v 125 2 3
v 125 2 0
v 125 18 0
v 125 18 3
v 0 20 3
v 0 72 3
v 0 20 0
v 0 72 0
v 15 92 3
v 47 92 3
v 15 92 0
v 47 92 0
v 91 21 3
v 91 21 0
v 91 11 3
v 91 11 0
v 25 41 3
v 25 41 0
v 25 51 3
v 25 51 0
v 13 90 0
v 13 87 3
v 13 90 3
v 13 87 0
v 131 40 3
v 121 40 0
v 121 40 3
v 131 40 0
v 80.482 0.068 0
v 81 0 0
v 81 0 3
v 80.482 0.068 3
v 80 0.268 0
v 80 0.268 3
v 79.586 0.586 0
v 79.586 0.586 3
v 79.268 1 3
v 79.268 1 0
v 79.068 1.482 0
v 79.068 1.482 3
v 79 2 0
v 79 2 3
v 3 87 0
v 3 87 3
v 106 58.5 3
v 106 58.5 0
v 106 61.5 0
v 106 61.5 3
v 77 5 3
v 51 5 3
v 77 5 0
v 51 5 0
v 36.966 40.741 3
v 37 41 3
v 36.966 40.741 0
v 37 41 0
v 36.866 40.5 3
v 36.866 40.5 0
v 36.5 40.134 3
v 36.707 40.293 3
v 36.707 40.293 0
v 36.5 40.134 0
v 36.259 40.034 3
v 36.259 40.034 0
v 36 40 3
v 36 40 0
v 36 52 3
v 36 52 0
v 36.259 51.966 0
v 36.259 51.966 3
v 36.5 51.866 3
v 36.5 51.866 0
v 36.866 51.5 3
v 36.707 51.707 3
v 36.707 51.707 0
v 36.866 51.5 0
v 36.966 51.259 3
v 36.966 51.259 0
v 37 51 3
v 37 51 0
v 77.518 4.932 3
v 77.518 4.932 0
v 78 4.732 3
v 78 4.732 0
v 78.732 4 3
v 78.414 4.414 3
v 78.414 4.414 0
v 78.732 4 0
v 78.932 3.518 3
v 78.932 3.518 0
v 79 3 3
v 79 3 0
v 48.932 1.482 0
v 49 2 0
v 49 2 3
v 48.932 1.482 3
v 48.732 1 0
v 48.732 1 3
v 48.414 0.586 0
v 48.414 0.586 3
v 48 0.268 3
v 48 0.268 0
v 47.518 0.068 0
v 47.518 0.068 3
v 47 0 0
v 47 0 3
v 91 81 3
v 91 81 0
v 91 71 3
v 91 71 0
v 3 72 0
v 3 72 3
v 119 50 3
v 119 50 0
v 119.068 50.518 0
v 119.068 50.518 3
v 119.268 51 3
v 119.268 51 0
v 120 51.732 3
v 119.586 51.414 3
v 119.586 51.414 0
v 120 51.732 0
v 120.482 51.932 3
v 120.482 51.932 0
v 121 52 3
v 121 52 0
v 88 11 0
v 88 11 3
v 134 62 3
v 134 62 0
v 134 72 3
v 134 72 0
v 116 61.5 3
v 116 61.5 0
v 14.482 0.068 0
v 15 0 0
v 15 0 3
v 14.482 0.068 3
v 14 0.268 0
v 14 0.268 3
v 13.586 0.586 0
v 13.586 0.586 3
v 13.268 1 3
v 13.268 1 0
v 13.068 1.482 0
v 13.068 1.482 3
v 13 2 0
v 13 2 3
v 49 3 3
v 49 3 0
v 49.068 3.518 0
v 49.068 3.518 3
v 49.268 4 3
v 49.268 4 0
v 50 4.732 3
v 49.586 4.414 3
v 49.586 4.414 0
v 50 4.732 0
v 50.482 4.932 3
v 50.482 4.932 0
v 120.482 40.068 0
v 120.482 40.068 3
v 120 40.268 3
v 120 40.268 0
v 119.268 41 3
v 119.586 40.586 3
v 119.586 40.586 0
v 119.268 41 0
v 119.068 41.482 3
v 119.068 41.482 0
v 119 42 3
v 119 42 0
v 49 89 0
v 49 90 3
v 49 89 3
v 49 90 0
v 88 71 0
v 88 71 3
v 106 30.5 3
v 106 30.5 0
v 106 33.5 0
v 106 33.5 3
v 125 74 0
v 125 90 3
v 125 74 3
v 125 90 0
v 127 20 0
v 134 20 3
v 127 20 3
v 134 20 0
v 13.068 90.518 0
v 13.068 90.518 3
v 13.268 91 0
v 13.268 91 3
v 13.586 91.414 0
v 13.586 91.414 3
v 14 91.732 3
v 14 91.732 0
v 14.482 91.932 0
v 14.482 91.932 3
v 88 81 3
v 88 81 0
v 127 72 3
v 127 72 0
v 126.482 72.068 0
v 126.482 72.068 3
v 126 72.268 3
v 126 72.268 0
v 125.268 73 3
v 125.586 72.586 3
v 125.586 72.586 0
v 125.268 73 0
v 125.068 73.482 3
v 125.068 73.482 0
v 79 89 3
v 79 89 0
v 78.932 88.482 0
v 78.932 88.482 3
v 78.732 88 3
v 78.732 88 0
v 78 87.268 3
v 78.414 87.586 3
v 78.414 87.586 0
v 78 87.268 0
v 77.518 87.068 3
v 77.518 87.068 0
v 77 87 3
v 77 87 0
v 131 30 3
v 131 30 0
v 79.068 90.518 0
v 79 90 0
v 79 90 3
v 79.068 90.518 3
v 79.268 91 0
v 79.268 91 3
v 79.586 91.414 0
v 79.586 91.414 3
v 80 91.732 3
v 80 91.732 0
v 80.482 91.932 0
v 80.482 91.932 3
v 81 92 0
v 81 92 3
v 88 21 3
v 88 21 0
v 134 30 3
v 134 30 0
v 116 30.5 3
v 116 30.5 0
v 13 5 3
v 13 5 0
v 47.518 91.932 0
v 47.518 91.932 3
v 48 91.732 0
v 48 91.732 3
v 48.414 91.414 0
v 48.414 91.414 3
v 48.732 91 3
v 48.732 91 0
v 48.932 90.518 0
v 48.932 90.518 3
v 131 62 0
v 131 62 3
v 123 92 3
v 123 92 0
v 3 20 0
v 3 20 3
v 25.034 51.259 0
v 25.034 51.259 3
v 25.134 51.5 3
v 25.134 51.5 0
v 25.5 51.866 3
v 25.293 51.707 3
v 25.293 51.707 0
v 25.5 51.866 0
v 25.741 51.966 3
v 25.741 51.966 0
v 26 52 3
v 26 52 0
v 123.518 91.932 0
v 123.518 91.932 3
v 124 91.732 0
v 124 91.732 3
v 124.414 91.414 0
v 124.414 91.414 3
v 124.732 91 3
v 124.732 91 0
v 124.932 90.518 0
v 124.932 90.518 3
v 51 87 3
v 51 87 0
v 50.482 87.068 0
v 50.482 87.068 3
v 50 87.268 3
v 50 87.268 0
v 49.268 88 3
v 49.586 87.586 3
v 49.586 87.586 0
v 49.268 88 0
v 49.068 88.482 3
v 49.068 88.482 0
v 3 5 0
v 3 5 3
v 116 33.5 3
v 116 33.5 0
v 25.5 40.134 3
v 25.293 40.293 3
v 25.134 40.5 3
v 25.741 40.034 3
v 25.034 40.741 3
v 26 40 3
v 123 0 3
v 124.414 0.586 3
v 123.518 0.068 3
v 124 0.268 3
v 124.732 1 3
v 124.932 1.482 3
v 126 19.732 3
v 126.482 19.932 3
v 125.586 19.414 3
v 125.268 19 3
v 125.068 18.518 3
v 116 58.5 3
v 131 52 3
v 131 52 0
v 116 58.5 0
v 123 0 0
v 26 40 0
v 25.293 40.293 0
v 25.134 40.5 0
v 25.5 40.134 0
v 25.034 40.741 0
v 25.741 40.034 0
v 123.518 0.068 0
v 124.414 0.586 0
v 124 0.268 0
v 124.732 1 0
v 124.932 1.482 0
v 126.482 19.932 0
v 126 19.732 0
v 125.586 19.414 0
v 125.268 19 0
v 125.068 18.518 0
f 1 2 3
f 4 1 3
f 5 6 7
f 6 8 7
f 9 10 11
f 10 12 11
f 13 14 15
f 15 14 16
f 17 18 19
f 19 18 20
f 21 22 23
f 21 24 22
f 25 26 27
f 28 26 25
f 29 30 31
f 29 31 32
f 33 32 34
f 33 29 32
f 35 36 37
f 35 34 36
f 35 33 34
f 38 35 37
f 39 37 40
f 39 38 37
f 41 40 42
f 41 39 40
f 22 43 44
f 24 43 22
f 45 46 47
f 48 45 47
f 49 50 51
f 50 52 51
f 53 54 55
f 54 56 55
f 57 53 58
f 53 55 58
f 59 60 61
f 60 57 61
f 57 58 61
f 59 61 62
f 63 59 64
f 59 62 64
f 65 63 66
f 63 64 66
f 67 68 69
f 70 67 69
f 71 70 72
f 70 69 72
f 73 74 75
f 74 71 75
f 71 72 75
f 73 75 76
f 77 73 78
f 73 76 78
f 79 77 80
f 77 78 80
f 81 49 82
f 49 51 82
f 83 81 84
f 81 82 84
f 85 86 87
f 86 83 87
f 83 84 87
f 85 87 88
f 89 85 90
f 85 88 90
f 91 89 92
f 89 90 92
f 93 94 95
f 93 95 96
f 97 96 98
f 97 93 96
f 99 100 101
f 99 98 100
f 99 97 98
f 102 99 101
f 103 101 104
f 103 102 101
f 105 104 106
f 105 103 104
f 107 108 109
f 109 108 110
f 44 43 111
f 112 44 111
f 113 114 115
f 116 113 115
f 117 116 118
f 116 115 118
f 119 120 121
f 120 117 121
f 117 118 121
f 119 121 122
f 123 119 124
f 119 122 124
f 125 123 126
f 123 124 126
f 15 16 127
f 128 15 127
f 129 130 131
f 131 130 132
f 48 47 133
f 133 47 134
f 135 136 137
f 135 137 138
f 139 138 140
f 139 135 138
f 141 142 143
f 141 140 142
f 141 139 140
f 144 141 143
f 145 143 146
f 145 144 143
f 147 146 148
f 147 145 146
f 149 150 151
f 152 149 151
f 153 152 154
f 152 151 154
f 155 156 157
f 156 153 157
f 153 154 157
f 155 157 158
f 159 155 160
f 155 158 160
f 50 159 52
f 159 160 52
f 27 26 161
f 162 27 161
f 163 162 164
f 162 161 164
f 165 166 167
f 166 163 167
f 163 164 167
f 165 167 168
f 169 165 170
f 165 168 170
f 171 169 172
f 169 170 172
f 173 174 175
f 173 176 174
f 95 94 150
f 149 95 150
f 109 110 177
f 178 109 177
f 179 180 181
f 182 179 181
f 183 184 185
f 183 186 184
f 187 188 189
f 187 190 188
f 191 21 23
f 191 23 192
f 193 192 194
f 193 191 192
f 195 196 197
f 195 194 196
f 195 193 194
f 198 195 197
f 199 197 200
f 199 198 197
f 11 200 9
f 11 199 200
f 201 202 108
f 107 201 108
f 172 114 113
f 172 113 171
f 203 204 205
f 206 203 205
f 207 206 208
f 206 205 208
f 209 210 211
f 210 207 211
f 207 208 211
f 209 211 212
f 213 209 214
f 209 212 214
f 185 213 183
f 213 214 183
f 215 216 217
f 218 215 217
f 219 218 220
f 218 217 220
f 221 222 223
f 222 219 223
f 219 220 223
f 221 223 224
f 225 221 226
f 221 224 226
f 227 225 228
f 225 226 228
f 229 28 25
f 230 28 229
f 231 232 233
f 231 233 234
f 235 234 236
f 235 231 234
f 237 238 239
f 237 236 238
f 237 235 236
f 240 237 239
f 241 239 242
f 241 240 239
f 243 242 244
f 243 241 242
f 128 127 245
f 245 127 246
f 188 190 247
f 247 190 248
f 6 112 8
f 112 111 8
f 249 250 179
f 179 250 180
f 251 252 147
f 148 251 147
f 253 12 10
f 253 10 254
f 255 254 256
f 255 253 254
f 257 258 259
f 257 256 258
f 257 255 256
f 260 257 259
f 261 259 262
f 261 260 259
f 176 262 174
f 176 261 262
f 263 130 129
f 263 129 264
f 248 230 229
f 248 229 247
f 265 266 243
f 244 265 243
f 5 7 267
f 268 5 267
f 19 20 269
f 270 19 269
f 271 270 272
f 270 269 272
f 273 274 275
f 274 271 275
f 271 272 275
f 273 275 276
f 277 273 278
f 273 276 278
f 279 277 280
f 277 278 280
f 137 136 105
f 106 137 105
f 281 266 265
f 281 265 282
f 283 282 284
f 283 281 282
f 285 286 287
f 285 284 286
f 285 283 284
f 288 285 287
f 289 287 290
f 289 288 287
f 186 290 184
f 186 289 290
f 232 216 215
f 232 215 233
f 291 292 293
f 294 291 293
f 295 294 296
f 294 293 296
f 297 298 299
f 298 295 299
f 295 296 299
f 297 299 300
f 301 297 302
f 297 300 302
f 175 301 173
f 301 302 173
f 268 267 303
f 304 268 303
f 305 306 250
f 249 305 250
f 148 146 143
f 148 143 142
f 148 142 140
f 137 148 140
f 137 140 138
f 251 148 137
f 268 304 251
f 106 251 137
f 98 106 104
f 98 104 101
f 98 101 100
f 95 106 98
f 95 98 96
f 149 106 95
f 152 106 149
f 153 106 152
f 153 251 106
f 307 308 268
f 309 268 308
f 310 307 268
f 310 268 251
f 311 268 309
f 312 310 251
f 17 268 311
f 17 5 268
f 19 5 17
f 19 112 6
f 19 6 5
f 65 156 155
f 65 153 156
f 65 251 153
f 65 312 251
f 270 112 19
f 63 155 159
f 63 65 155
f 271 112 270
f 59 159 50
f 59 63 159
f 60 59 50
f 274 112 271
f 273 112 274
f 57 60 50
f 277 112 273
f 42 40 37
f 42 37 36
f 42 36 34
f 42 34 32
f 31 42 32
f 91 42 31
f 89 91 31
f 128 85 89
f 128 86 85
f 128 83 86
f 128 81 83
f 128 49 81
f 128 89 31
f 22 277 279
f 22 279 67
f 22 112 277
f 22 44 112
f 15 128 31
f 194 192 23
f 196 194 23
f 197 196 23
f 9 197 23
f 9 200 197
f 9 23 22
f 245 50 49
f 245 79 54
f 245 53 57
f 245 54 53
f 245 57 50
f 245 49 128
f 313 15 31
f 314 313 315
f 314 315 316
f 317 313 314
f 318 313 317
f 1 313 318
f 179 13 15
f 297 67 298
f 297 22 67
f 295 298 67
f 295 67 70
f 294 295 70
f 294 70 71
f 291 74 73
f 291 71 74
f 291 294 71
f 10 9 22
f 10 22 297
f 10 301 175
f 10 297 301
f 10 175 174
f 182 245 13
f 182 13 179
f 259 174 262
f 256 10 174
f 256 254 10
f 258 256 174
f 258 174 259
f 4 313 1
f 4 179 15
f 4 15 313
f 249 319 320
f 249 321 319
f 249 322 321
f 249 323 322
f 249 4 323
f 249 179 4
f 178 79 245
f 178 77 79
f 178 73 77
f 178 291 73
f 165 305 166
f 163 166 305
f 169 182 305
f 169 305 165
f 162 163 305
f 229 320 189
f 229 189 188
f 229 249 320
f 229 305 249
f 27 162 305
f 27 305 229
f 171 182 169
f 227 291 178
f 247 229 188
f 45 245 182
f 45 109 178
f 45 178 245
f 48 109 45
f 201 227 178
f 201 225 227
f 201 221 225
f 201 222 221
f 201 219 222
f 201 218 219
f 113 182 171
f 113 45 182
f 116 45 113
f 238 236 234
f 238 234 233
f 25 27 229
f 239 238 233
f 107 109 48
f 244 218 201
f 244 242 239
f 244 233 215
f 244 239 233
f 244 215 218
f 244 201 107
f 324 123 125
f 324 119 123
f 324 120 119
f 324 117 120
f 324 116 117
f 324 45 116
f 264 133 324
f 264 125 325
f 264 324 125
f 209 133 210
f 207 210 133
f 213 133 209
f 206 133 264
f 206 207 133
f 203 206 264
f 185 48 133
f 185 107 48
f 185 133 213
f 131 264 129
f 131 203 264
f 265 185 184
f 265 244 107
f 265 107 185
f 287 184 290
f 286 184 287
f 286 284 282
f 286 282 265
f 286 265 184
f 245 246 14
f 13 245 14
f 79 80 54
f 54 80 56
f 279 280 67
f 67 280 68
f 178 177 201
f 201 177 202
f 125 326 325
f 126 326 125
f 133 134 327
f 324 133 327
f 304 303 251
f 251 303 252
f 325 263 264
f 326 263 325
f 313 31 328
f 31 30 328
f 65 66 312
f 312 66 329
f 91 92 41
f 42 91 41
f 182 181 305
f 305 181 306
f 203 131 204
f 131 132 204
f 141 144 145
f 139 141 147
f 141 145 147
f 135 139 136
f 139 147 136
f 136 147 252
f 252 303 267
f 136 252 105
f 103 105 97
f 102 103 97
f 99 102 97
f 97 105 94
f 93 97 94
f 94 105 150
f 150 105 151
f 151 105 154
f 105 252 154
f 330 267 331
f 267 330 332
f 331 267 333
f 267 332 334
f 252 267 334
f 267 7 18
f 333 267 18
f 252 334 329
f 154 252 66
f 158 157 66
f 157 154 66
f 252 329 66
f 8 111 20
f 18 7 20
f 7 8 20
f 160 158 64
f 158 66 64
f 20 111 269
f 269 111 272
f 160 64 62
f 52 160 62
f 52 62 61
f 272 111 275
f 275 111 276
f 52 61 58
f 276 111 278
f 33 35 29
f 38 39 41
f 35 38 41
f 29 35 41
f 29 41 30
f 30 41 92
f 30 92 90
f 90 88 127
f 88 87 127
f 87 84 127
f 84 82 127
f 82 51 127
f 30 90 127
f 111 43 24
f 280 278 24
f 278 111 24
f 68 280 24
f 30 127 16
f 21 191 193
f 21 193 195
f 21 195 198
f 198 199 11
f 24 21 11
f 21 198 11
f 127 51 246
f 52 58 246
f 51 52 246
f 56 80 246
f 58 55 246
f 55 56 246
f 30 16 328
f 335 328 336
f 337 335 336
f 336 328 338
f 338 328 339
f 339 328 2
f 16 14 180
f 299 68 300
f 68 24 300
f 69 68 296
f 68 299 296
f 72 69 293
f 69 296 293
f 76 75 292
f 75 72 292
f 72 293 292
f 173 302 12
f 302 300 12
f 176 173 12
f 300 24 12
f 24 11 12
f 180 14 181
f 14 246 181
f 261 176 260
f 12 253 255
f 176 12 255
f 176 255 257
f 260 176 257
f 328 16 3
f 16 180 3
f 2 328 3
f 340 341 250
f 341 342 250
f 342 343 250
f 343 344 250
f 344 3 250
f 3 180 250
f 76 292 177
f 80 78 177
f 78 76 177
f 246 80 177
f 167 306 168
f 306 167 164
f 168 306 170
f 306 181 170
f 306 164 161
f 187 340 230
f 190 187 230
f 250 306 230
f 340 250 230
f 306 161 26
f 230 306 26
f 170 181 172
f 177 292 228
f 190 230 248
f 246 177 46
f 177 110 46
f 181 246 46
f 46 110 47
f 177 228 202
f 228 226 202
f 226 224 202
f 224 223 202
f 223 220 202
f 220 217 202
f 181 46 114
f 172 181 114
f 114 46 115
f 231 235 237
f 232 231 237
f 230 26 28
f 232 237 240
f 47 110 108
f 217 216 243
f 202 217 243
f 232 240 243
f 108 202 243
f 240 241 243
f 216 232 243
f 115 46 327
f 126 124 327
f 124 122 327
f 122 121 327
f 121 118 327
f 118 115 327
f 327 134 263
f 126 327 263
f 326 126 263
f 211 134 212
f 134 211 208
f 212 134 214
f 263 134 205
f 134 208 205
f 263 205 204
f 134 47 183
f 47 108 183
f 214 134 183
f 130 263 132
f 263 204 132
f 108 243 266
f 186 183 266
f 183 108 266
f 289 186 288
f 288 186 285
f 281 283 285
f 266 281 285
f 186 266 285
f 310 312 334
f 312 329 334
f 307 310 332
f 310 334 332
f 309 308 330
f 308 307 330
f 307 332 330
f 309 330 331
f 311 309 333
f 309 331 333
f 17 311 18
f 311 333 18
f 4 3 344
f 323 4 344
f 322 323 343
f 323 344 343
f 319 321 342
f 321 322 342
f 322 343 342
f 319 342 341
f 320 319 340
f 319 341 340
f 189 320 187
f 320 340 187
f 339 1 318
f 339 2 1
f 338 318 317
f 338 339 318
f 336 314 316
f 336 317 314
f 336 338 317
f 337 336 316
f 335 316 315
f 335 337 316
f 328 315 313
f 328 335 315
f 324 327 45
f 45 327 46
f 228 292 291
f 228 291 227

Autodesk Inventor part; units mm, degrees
ref_plane "YZ Plane" through (0, 0, 0) normal (1, 0, 0) x (0, 1, 0)
ref_plane "XZ Plane" through (0, 0, 0) normal (0, 1, 0) x (-1, 0, 0)
ref_plane "XY Plane" through (0, 0, 0) normal (0, 0, 1) x (1, 0, 0)
sketch "Sketch1" plane through (0, 0, 0) normal (0, 0, 1) x (1, 0, 0)
  line L0 (134, 62) -> (131, 62)
  line L1 (131, 30) -> (134, 30)
  line L2 (134, 20) -> (134, 30)
  line L3 (134, 62) -> (134, 72)
  line L4 (3, 87) -> (3, 72)
  line L5 (3, 72) -> (0, 72)
  line L6 (0, 20) -> (3, 20)
  line L7 (3, 20) -> (3, 5)
  line L8 (0, 72) -> (0, 20)
  line L9 (131, 52) -> (121, 52)
  line L10 (119, 50) -> (119, 42)
  line L11 (121, 40) -> (131, 40)
  line L12 (131, 62) -> (131, 52)
  line L13 (131, 40) -> (131, 30)
  line L14 (106, 61.5) -> (116, 61.5)
  line L15 (116, 61.5) -> (116, 58.5)
  line L16 (116, 58.5) -> (106, 58.5)
  line L17 (106, 58.5) -> (106, 61.5)
  line L18 (106, 33.5) -> (116, 33.5)
  line L19 (116, 33.5) -> (116, 30.5)
  line L20 (116, 30.5) -> (106, 30.5)
  line L21 (106, 30.5) -> (106, 33.5)
  line L22 (88, 81) -> (91, 81)
  line L23 (91, 81) -> (91, 71)
  line L24 (91, 71) -> (88, 71)
  line L25 (88, 71) -> (88, 81)
  line L26 (88, 21) -> (91, 21)
  line L27 (91, 21) -> (91, 11)
  line L28 (91, 11) -> (88, 11)
  line L29 (88, 11) -> (88, 21)
  line L30 (134, 20) -> (127, 20)
  line L31 (125, 2) -> (125, 18)
  line L32 (134, 72) -> (127, 72)
  line L33 (125, 90) -> (125, 74)
  line L34 (49, 90) -> (49, 89)
  line L35 (51, 87) -> (77, 87)
  line L36 (79, 89) -> (79, 90)
  line L37 (123, 92) -> (81, 92)
  line L38 (49, 2) -> (49, 3)
  line L39 (51, 5) -> (77, 5)
  line L40 (79, 3) -> (79, 2)
  line L41 (81, 0) -> (123, 0)
  arc A0 (49, 90) -> (47, 92) centre (47, 90) ccw
  arc A1 (49, 89) -> (51, 87) centre (51, 89) ccw
  arc A2 (77, 87) -> (79, 89) centre (77, 89) ccw
  arc A3 (81, 92) -> (79, 90) centre (81, 90) ccw
  arc A4 (125, 74) -> (127, 72) centre (127, 74) ccw
  arc A5 (121, 52) -> (119, 50) centre (121, 50) ccw
  arc A6 (119, 42) -> (121, 40) centre (121, 42) ccw
  arc A7 (127, 20) -> (125, 18) centre (127, 18) ccw
  arc A8 (79, 2) -> (81, 0) centre (81, 2) ccw
  arc A9 (79, 3) -> (77, 5) centre (77, 3) ccw
  arc A10 (51, 5) -> (49, 3) centre (51, 3) ccw
  arc A11 (47, 0) -> (49, 2) centre (47, 2) ccw
  arc A12 (123, 0) -> (125, 2) centre (123, 2) ccw
  arc A13 (125, 90) -> (123, 92) centre (123, 90) ccw
  line L42 (3, 5) -> (13, 5)
  line L43 (13, 5) -> (13, 2)
  line L44 (15, 0) -> (47, 0)
  line L45 (3, 87) -> (13, 87)
  line L46 (13, 87) -> (13, 90)
  line L47 (47, 92) -> (15, 92)
  line L48 (26, 52) -> (36, 52)
  line L49 (37, 51) -> (37, 41)
  line L50 (36, 40) -> (26, 40)
  line L51 (25, 41) -> (25, 51)
  arc A14 (25, 41) -> (26, 40) centre (26, 41) ccw
  arc A15 (26, 52) -> (25, 51) centre (26, 51) ccw
  arc A16 (37, 51) -> (36, 52) centre (36, 51) ccw
  arc A17 (36, 40) -> (37, 41) centre (36, 41) ccw
  arc A18 (13, 2) -> (15, 0) centre (15, 2) ccw
  arc A19 (15, 92) -> (13, 90) centre (15, 90) ccw
  point P0 (0, 0)
  point P1 (125, 0)
  point P2 (125, 92)
  point P3 (119, 52)
  point P4 (119, 40)
  point P5 (125, 20)
  point P6 (125, 72)
  point P7 (49, 87)
  point P8 (79, 87)
  point P9 (79, 92)
  point P10 (49, 0)
  point P11 (49, 5)
  point P12 (79, 5)
  point P13 (79, 0)
  point P14 (13, 0)
  point P15 (13, 92)
  point P16 (25, 52)
  point P17 (37, 40)
  point P18 (37, 52)
  dimension "d6" = 52
  dimension "d8" = 10
  dimension "d12" = 10
  dimension "d14" = 3
  dimension "d15" = 3
  dimension "d19" = 12
  dimension "d20" = 12
  dimension "d22" = 10
  dimension "d24" = 10
  dimension "d26" = 10
  dimension "d27" = 10
  dimension "d28" = 3
  dimension "d29" = 3
  dimension "d30" = 25
  dimension "d32" = 15
  dimension "d33" = 3
  dimension "d34" = 10
  dimension "d35" = 10
  dimension "d36" = 3
  dimension "d46" = 40
  dimension "d47" = 20
  dimension "d48" = 9
  dimension "d51" = 3
  dimension "d67" = 46
  dimension "d69" = 30
  dimension "d70" = 30
  dimension "d74" = 46
  dimension "d76" = 122
  dimension "d77" = 2
  dimension "d78" = 2
  dimension "d79" = 3
  dimension "d80" = 128
  dimension "d81" = 40
  dimension "d90" = 12
  dimension "d91" = 12
  dimension "d92" = 25
  dimension "d95" = 40
  dimension "d96" = 1
  dimension "d99" = 9
  dimension "d102" = 82
  dimension "d103" = 5
  dimension "d104" = 5
  dimension "d105" = 2
extrude "Extrusion6" add sketch "Sketch1" along normal blind 3
properties part number "OpenROV_Dev_EChassis_Main_Plate"
